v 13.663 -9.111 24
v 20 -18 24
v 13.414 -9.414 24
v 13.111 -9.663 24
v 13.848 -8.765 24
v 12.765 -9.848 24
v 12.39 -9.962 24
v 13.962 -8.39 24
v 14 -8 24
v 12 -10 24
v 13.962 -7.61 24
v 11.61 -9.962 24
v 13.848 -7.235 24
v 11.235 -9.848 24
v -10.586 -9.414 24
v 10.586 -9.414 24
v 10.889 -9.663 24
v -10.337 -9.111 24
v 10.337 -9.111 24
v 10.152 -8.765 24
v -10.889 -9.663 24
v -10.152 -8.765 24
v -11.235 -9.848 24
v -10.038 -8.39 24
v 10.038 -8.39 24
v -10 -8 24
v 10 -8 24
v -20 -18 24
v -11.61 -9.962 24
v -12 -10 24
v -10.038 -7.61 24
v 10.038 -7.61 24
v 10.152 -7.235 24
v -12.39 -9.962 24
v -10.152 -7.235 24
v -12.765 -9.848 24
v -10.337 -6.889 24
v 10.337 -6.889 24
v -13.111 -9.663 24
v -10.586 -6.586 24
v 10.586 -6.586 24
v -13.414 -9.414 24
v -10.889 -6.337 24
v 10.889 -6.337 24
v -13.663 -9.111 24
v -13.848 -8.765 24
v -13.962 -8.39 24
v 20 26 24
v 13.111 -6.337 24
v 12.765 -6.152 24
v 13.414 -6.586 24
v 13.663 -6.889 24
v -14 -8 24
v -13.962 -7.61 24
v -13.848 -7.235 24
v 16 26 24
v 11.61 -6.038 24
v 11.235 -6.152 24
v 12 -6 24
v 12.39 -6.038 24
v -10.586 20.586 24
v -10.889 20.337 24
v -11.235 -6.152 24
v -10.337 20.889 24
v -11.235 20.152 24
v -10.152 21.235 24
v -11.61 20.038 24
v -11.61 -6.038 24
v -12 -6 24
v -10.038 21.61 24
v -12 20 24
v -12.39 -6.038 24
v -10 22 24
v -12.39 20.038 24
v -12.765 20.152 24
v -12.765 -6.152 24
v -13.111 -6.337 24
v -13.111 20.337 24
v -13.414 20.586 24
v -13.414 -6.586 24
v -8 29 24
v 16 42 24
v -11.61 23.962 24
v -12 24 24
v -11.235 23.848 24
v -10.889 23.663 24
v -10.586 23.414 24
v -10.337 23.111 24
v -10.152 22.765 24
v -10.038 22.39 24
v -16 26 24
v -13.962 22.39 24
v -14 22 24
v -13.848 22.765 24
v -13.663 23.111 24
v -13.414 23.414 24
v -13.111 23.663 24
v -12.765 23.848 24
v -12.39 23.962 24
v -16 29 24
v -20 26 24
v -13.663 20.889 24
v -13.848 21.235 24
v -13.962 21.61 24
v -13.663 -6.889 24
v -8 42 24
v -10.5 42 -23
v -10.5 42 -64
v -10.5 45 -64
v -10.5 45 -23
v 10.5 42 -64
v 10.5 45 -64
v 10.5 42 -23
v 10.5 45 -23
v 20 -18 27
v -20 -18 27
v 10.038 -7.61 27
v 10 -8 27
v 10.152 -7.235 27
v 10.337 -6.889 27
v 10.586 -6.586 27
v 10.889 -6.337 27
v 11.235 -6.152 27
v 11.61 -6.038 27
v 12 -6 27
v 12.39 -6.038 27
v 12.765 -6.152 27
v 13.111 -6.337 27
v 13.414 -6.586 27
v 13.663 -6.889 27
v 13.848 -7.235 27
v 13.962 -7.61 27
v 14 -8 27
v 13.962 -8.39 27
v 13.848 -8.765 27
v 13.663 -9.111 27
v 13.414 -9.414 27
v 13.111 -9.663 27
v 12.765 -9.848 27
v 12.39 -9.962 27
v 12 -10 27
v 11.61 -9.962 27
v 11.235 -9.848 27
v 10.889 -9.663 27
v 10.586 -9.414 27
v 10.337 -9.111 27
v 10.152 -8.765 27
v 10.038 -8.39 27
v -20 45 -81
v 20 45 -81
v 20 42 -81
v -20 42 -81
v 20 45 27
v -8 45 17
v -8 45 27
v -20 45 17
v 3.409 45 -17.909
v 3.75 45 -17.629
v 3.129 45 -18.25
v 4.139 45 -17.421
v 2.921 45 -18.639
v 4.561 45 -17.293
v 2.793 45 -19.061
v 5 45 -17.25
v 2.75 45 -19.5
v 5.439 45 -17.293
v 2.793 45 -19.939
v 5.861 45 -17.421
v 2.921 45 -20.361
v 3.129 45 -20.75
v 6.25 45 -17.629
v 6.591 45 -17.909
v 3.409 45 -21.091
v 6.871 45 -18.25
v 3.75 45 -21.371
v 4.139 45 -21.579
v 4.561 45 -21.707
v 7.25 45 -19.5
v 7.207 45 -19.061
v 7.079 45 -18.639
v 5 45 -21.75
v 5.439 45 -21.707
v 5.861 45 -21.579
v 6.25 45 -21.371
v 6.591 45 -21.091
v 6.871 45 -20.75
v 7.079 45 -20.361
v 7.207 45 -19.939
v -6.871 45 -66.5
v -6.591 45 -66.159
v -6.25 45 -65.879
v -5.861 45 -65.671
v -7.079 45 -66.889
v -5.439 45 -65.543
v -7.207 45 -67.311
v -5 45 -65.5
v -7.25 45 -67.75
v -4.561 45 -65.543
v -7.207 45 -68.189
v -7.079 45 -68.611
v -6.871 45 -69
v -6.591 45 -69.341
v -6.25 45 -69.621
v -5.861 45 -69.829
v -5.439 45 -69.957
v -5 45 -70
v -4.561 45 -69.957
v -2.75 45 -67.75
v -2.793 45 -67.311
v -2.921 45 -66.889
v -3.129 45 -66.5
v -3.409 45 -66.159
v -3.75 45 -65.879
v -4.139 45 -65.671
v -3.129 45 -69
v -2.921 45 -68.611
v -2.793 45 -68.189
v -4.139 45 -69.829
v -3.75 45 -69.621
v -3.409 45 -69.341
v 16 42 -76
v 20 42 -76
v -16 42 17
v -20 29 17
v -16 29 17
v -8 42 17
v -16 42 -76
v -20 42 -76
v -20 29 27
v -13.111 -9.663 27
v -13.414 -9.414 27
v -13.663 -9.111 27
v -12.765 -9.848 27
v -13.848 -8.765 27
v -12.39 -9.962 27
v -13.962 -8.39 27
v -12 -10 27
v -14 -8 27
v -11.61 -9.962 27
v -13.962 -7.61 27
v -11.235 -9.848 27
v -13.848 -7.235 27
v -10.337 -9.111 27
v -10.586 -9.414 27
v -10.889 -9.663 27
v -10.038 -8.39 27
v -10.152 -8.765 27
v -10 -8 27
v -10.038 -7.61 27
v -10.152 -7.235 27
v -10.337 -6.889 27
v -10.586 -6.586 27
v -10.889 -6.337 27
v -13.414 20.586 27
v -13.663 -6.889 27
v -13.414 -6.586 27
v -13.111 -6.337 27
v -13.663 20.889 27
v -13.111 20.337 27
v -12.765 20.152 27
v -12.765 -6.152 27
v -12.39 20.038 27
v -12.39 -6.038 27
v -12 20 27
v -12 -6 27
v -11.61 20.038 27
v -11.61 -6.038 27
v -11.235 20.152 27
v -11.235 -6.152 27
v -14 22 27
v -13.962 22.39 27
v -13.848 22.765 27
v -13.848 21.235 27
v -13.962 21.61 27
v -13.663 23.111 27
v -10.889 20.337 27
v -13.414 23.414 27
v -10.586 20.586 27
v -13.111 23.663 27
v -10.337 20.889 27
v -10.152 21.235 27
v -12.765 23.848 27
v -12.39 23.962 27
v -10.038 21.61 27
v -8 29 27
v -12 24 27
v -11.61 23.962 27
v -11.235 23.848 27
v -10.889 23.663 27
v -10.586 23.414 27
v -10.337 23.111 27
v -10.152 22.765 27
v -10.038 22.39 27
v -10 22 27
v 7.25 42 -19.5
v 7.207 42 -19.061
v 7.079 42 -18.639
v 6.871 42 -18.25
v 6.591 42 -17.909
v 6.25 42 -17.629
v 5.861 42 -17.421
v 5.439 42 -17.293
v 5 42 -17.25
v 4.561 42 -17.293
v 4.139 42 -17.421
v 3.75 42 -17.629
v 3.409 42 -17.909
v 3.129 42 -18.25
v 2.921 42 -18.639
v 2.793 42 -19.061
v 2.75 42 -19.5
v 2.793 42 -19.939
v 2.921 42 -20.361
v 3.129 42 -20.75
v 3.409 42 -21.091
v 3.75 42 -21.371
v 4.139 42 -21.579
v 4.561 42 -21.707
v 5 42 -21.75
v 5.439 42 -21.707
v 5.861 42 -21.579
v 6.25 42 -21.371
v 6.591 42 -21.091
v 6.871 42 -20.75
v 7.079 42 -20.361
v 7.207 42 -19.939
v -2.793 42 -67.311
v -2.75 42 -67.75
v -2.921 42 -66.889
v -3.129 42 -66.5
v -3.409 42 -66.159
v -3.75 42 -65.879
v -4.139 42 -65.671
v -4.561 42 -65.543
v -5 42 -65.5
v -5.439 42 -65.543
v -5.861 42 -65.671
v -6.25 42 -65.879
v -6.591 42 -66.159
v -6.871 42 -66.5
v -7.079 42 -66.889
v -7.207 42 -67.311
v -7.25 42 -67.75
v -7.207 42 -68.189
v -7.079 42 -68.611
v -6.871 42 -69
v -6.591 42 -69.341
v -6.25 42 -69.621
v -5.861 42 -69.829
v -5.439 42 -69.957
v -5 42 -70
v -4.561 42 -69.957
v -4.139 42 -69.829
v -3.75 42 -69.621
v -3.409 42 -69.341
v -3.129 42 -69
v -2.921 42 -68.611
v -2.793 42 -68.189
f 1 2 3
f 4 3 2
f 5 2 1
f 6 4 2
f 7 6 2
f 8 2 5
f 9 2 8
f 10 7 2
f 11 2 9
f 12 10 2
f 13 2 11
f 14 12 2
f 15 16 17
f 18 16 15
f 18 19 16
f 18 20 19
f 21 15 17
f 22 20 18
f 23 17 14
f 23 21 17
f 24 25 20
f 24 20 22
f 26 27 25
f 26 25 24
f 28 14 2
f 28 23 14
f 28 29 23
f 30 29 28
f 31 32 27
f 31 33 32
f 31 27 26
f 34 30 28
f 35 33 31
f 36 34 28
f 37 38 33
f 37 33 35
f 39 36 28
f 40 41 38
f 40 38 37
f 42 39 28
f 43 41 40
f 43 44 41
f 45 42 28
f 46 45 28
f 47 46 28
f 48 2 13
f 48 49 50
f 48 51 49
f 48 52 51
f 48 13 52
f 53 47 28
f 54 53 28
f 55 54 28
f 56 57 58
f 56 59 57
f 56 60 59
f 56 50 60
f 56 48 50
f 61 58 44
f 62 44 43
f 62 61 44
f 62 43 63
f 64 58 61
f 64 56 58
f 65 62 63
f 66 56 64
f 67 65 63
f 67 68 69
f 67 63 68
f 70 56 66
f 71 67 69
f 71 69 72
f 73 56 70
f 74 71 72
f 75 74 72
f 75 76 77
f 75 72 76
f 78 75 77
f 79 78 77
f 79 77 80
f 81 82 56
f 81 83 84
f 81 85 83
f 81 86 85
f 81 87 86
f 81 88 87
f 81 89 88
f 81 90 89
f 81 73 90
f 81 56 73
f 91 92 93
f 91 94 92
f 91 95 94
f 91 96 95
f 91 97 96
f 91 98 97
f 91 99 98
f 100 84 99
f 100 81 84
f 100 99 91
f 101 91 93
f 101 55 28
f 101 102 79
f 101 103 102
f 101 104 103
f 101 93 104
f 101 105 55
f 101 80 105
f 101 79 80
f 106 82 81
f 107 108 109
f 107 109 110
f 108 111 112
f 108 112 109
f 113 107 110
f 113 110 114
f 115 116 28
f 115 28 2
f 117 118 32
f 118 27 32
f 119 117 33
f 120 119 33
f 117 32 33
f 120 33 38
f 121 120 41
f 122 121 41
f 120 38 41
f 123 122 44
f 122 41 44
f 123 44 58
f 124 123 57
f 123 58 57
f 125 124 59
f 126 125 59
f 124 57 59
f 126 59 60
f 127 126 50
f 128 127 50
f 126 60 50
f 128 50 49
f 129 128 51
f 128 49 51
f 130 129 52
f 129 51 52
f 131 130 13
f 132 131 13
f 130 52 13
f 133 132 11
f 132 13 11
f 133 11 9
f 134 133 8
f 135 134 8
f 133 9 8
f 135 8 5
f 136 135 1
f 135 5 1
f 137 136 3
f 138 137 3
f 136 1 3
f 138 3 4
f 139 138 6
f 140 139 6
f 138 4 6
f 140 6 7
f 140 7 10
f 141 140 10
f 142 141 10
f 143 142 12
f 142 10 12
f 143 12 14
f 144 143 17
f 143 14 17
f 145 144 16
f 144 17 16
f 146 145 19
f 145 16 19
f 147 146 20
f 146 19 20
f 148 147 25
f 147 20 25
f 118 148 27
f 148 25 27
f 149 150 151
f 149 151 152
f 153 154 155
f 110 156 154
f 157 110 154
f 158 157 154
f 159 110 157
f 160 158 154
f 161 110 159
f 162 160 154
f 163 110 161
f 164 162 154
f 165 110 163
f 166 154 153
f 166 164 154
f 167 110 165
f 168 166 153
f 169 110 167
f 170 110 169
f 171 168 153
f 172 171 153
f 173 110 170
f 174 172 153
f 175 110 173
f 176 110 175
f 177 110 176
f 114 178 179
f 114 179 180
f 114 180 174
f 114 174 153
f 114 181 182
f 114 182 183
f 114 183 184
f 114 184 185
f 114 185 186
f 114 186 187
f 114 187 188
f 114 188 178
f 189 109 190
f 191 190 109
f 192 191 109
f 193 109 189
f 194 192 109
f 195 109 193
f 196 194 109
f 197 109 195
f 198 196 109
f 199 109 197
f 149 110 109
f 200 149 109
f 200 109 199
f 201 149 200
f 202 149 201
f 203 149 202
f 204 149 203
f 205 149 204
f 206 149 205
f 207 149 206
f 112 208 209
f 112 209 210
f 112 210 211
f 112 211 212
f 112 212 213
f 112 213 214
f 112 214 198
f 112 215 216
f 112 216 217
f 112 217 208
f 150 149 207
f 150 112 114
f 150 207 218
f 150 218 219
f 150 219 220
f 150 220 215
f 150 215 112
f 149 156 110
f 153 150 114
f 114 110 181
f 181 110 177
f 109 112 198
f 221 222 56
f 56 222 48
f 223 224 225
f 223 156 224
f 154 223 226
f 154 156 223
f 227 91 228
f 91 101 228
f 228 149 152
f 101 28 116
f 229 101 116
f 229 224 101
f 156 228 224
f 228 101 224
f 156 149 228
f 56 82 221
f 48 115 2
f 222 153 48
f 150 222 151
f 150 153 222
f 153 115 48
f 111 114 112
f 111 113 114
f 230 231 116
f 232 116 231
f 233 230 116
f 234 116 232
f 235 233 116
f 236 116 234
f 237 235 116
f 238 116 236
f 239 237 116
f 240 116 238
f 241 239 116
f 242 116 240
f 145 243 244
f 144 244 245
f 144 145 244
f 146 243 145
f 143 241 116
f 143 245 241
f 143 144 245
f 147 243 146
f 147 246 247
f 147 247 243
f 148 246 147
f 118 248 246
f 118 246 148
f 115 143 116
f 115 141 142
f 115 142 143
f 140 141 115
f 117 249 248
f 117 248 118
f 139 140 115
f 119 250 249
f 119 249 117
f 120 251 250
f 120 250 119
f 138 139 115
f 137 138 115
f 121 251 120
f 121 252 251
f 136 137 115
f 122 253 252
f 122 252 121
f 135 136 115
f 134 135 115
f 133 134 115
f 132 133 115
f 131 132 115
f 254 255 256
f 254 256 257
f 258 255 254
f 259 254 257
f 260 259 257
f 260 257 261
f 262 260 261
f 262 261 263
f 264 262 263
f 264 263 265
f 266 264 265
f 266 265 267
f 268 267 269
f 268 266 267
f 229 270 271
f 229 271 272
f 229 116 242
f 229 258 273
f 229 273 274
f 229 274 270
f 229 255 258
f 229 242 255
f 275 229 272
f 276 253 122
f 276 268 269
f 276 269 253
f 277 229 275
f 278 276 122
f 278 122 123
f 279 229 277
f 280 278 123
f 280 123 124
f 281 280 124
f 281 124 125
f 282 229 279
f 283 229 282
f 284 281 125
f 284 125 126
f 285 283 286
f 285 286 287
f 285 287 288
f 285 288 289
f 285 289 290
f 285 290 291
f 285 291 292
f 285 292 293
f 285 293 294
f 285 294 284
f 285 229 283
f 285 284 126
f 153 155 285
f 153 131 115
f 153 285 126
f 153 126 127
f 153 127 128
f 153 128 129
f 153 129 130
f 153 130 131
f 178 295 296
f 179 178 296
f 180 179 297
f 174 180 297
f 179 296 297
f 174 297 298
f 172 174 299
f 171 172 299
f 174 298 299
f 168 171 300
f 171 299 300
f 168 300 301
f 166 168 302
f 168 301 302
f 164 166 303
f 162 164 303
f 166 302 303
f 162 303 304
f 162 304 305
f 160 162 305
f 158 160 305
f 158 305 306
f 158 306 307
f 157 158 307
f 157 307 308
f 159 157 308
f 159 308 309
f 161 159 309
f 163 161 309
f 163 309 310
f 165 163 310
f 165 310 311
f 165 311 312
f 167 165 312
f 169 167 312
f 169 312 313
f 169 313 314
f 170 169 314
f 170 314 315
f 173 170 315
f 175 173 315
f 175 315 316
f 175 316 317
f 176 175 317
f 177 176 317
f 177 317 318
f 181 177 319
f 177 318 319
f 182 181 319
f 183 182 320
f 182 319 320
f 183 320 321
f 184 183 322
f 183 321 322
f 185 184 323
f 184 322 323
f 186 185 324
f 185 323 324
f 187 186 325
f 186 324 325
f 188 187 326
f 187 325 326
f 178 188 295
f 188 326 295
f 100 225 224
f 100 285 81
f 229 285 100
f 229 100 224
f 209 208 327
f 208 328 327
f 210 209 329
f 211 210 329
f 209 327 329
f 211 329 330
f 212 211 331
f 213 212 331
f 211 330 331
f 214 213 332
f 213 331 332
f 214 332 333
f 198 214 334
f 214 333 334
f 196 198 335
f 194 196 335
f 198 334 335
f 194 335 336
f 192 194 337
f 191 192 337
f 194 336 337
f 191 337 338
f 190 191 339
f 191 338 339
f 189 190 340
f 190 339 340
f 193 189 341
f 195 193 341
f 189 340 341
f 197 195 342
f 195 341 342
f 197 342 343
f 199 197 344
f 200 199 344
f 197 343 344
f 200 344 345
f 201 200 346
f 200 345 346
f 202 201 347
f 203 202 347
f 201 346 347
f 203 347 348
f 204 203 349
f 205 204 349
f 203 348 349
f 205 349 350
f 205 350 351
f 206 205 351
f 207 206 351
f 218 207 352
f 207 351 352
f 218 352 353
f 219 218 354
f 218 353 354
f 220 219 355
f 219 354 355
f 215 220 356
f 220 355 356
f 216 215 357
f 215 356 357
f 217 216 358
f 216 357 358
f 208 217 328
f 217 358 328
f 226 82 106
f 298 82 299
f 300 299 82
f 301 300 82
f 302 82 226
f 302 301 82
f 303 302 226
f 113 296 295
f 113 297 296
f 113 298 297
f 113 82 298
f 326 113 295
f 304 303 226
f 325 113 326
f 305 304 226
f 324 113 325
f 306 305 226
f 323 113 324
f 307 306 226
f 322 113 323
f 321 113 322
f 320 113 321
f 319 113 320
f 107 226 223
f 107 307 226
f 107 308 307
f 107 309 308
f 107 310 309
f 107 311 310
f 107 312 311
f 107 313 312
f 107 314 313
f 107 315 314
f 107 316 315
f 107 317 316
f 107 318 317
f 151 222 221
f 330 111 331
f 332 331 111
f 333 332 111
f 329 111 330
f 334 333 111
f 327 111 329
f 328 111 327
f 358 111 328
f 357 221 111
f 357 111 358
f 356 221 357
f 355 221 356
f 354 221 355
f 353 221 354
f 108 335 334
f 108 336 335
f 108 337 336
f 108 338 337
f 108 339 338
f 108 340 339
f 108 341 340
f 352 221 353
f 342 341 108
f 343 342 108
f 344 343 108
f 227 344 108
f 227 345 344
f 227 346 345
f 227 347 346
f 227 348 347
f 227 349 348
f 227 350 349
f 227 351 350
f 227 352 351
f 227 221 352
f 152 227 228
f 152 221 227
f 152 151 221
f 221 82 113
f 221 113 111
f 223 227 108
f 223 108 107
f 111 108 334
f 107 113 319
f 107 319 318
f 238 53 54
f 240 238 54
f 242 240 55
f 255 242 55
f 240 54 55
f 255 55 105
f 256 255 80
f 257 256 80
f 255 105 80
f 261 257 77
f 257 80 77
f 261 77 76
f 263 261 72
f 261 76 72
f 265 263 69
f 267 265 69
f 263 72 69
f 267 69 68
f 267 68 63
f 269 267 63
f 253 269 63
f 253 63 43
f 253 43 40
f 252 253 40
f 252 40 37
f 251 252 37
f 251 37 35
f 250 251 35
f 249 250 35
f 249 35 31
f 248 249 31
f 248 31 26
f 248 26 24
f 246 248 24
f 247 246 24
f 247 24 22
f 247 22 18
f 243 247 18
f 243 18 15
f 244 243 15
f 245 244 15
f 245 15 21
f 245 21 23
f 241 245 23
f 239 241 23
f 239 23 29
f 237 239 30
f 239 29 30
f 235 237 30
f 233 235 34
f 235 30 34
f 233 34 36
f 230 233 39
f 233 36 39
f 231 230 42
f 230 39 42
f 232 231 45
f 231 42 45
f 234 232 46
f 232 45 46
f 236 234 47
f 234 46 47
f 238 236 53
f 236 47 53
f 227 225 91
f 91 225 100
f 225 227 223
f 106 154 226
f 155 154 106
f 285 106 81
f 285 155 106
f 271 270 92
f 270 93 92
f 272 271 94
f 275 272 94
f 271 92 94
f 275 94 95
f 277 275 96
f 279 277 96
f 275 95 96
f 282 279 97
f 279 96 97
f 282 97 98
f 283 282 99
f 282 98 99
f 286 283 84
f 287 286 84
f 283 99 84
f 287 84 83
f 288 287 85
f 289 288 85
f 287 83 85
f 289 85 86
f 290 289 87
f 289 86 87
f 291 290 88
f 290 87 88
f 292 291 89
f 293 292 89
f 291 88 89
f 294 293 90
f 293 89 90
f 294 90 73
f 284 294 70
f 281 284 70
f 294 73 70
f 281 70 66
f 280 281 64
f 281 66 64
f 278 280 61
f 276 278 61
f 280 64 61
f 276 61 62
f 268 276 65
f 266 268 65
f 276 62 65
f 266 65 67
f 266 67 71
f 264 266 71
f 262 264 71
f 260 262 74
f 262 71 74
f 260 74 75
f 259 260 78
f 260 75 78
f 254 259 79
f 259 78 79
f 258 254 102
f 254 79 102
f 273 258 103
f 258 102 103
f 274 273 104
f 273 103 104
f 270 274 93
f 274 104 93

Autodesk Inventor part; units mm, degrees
ref_plane "YZ Plane" through (0, 0, 0) normal (1, 0, 0) x (0, 1, 0)
sketch "Sketch1" plane through (0, 0, 0) normal (0, 0, 1) x (1, 0, 0)
  line L0 (-31, -31) -> (31, -31)
  line L1 (31, -31) -> (31, 31)
  line L2 (31, 31) -> (-31, 31)
  line L3 (-31, 31) -> (-31, -31)
  line L4 (-31, -31) -> (31, 31) construction
  line L5 (31, -31) -> (-31, 31) construction
  line L6 (-33, 33) -> (33, 33)
  line L7 (33, 33) -> (33, -33)
  line L8 (33, -33) -> (-33, -33)
  line L9 (-33, -33) -> (-33, 33)
  point P0 (0, 0)
  dimension "d0" = 62
  dimension "d1" = 62
  dimension "d2" = 2
extrude "Extrusion1" add sketch "Sketch1" along normal blind 2 contours L3 L2 L1 L0 | L6 L7 L8 L9
extrude "Extrusion2" add sketch "Sketch1" against normal blind 12
sketch "Sketch2" plane through (-33, 33, 2) normal (0, 1, 0) x (1, 0, 0)
  line L0 (13, 3) -> (53, 3)
  line L1 (53, 3) -> (53, 0)
  line L2 (53, 0) -> (13, 0)
  line L3 (13, 0) -> (13, 3)
  line L4 (0, 14) -> (0, 0) projected
  line L5 (0, 14) -> (66, 14) projected
  point P0 (33, 2)
  dimension "d7" = 40
  dimension "d8" = 3
  dimension "d9" = 13
  dimension "d10" = 11
extrude "Extrusion3" add sketch "Sketch2" along normal blind 12
sketch "Sketch3" plane through (20, 33, -1) normal (0, 0, -1) x (-1, 0, 0)
  line L0 (40, 12) -> (0, 12) projected
  line L1 (40, 0) -> (40, 12) projected
  line L2 (0, 12) -> (40, 12)
  line L3 (40, 12) -> (40, 9)
  line L4 (40, 9) -> (0, 9)
  line L5 (0, 9) -> (0, 12)
  point P0 (20, -33)
  dimension "d13" = 3
extrude "Extrusion4" add sketch "Sketch3" along normal blind 80
sketch "Sketch4" plane through (-20, 42, -1) normal (0, -1, 0) x (1, 0, 0)
  line L0 (30.5, -63) -> (9.5, -63)
  line L1 (9.5, -63) -> (9.5, -22)
  line L2 (9.5, -22) -> (30.5, -22)
  line L3 (30.5, -22) -> (30.5, -63)
  line L4 (40, 3) -> (40, -80) projected
  line L5 (0, 3) -> (40, 3) projected
  point P0 (20, 1)
  dimension "d16" = 21
  dimension "d17" = 41
  dimension "d18" = 9.5
  dimension "d19" = 25
extrude "Extrusion5" cut sketch "Sketch4" against normal blind 80
sketch "Sketch5" plane through (-20, 42, -1) normal (0, -1, 0) x (1, 0, 0)
  line L0 (30.5, -63) -> (9.5, -63) projected
  line L1 (30.5, -63) -> (9.5, -63)
  line L2 (9.5, -63) -> (9.5, -70)
  line L3 (9.5, -70) -> (30.5, -70)
  line L4 (30.5, -70) -> (30.5, -63)
  circle A0 centre (15, -66.75) radius 2.25
  line L5 (30.5, -22) -> (30.5, -63) projected
  line L6 (30.5, -22) -> (9.5, -22)
  line L7 (9.5, -22) -> (9.5, -15)
  line L8 (9.5, -15) -> (30.5, -15)
  line L9 (30.5, -15) -> (30.5, -22)
  circle A1 centre (25, -18.5) radius 2.25
  point P0 (20, 1)
  point P1 (14.9217, -69.81)
  point P2 (13.9783, -69.81)
  point P3 (25.0283, -15.19)
  point P4 (25.9717, -15.19)
  dimension "d22" = 7
  dimension "d23" = 4.5
  dimension "d24" = 3.75
  dimension "d25" = 5.5
  dimension "d26" = 7
  dimension "d27" = 4.5
  dimension "d28" = 5.5
  dimension "d29" = 3.5
extrude "Extrusion6" cut sketch "Sketch5" against normal blind 80 contours A0 | A1
sketch "Sketch6" plane through (-33, -33, 2) normal (0, -1, 0) x (1, 0, 0)
  line L0 (0, -14) -> (0, 0) projected
  line L1 (66, -14) -> (66, 0) projected
  line L2 (0, 0) -> (66, 0)
  line L3 (66, 0) -> (66, -14)
  line L4 (66, -14) -> (0, -14)
  line L5 (0, -14) -> (0, 0)
  point P0 (33, -2)
  point P1 (66, 0)
extrude "Extrusion7" cut sketch "Sketch6" against normal up to surface (75 mm away)
sketch "Sketch7" plane through (0, 0, 2) normal (0, 0, 1) x (1, 0, 0)
  line L0 (-20, 42) -> (-20, 45) projected
  line L1 (20, 42) -> (20, 45) projected
  line L2 (-20, 45) -> (20, 45)
  line L3 (20, 45) -> (20, 42)
  line L4 (20, 42) -> (-20, 42)
  line L5 (-20, 42) -> (-20, 45)
  point P0 (0, 0)
extrude "Extrusion8" add sketch "Sketch7" along normal blind 25
sketch "Sketch8" plane through (-20, 42, -81) normal (0, -1, 0) x (1, 0, 0)
  line L0 (0, 108) -> (0, 0) projected
  line L1 (40, 0) -> (40, 108) projected
  line L2 (0, 108) -> (40, 108)
  line L3 (40, 108) -> (40, 105)
  line L4 (40, 105) -> (0, 105)
  line L5 (0, 105) -> (0, 108)
  point P0 (20, 81)
  dimension "d36" = 3
extrude "Extrusion9" add sketch "Sketch8" along normal blind 100
sketch "Sketch9" plane through (20, 42, 24) normal (0, 0, -1) x (-1, 0, 0)
  circle A0 centre (20, -90) radius 2
  circle A1 centre (8, -50) radius 2
  circle A2 centre (32, -20) radius 2
  line L0 (40, 0) -> (40, -100) projected
  line L1 (0, 0) -> (0, -100) projected
  line L2 (40, -100) -> (0, -100) projected
  line L3 (0, 0) -> (40, 0) projected
  point P0 (20, -42)
  dimension "d39" = 4
  dimension "d40" = 4
  dimension "d41" = 4
  dimension "d42" = 8
  dimension "d43" = 8
  dimension "d44" = 20
  dimension "d45" = 10
  dimension "d46" = 50
  dimension "d47" = 20
extrude "Extrusion10" cut sketch "Sketch9" against normal blind 10 contours A0 | A1 | A2
ref_plane "Work Plane1" through (0, 45, 27) normal (1, 0, 0) x (0, 0, -1)
sketch "Sketch11" plane through (20, 45, 27) normal (1, 0, 0) x (0, 0, -1)
  line L0 (3, -3) -> (3, -103) projected
  line L1 (3, -3) -> (103, -3)
  line L2 (103, -3) -> (103, -19)
  line L3 (103, -19) -> (3, -19)
  line L4 (3, -19) -> (3, -3)
  line L5 (103, -3) -> (3, -19)
  point P0 (27, -45)
  point P1 (3, -19)
  dimension "d55" = 100
  dimension "d56" = 16
extrude "Extrusion12" add sketch "Sketch11" against normal blind 4 contours L1 L5 L0
ref_plane "Work Plane2" through (0, 45, -81) normal (-1, 0, 0) x (0, 0, 1)
mirror "Mirror1" about plane through (0, 45, -81) normal (-1, 0, 0) of "Extrusion12"
sketch "Sketch12" plane through (-20, -58, -81) normal (0, -1, 0) x (1, 0, 0)
  line L0 (0, 108) -> (0, 0) projected
  line L1 (40, 0) -> (40, 108) projected
  line L2 (0, 108) -> (40, 108)
  line L3 (40, 108) -> (40, 105)
  line L4 (40, 105) -> (0, 105)
  line L5 (0, 105) -> (0, 108)
  point P0 (20, 81)
  dimension "d59" = 3
extrude "Extrusion13" cut sketch "Sketch12" against normal blind 40
sketch "Sketch13" plane through (20, 26, 24) normal (0, 0, -1) x (-1, 0, 0)
  circle A0 centre (32, -34) radius 2
  line L0 (0, -44) -> (40, -44) projected
  line L1 (40, 0) -> (40, -44) projected
  point P0 (20, -26)
  dimension "d62" = 4
  dimension "d63" = 10
  dimension "d64" = 8
extrude "Extrusion14" cut sketch "Sketch13" against normal blind 40
sketch "Sketch14" plane through (0, 0, 27) normal (0, 0, 1) x (1, 0, 0)
  line L0 (-20, 45) -> (20, 45) projected
  line L1 (-20, 45) -> (-8, 45)
  line L2 (-8, 45) -> (-8, 29)
  line L3 (-8, 29) -> (-20, 29)
  line L4 (-20, 29) -> (-20, 45)
  point P0 (0, 0)
  dimension "d67" = 12
  dimension "d68" = 16
extrude "Extrusion15" cut sketch "Sketch14" against normal blind 10
properties part number "pan_base_holder_first_v1"
